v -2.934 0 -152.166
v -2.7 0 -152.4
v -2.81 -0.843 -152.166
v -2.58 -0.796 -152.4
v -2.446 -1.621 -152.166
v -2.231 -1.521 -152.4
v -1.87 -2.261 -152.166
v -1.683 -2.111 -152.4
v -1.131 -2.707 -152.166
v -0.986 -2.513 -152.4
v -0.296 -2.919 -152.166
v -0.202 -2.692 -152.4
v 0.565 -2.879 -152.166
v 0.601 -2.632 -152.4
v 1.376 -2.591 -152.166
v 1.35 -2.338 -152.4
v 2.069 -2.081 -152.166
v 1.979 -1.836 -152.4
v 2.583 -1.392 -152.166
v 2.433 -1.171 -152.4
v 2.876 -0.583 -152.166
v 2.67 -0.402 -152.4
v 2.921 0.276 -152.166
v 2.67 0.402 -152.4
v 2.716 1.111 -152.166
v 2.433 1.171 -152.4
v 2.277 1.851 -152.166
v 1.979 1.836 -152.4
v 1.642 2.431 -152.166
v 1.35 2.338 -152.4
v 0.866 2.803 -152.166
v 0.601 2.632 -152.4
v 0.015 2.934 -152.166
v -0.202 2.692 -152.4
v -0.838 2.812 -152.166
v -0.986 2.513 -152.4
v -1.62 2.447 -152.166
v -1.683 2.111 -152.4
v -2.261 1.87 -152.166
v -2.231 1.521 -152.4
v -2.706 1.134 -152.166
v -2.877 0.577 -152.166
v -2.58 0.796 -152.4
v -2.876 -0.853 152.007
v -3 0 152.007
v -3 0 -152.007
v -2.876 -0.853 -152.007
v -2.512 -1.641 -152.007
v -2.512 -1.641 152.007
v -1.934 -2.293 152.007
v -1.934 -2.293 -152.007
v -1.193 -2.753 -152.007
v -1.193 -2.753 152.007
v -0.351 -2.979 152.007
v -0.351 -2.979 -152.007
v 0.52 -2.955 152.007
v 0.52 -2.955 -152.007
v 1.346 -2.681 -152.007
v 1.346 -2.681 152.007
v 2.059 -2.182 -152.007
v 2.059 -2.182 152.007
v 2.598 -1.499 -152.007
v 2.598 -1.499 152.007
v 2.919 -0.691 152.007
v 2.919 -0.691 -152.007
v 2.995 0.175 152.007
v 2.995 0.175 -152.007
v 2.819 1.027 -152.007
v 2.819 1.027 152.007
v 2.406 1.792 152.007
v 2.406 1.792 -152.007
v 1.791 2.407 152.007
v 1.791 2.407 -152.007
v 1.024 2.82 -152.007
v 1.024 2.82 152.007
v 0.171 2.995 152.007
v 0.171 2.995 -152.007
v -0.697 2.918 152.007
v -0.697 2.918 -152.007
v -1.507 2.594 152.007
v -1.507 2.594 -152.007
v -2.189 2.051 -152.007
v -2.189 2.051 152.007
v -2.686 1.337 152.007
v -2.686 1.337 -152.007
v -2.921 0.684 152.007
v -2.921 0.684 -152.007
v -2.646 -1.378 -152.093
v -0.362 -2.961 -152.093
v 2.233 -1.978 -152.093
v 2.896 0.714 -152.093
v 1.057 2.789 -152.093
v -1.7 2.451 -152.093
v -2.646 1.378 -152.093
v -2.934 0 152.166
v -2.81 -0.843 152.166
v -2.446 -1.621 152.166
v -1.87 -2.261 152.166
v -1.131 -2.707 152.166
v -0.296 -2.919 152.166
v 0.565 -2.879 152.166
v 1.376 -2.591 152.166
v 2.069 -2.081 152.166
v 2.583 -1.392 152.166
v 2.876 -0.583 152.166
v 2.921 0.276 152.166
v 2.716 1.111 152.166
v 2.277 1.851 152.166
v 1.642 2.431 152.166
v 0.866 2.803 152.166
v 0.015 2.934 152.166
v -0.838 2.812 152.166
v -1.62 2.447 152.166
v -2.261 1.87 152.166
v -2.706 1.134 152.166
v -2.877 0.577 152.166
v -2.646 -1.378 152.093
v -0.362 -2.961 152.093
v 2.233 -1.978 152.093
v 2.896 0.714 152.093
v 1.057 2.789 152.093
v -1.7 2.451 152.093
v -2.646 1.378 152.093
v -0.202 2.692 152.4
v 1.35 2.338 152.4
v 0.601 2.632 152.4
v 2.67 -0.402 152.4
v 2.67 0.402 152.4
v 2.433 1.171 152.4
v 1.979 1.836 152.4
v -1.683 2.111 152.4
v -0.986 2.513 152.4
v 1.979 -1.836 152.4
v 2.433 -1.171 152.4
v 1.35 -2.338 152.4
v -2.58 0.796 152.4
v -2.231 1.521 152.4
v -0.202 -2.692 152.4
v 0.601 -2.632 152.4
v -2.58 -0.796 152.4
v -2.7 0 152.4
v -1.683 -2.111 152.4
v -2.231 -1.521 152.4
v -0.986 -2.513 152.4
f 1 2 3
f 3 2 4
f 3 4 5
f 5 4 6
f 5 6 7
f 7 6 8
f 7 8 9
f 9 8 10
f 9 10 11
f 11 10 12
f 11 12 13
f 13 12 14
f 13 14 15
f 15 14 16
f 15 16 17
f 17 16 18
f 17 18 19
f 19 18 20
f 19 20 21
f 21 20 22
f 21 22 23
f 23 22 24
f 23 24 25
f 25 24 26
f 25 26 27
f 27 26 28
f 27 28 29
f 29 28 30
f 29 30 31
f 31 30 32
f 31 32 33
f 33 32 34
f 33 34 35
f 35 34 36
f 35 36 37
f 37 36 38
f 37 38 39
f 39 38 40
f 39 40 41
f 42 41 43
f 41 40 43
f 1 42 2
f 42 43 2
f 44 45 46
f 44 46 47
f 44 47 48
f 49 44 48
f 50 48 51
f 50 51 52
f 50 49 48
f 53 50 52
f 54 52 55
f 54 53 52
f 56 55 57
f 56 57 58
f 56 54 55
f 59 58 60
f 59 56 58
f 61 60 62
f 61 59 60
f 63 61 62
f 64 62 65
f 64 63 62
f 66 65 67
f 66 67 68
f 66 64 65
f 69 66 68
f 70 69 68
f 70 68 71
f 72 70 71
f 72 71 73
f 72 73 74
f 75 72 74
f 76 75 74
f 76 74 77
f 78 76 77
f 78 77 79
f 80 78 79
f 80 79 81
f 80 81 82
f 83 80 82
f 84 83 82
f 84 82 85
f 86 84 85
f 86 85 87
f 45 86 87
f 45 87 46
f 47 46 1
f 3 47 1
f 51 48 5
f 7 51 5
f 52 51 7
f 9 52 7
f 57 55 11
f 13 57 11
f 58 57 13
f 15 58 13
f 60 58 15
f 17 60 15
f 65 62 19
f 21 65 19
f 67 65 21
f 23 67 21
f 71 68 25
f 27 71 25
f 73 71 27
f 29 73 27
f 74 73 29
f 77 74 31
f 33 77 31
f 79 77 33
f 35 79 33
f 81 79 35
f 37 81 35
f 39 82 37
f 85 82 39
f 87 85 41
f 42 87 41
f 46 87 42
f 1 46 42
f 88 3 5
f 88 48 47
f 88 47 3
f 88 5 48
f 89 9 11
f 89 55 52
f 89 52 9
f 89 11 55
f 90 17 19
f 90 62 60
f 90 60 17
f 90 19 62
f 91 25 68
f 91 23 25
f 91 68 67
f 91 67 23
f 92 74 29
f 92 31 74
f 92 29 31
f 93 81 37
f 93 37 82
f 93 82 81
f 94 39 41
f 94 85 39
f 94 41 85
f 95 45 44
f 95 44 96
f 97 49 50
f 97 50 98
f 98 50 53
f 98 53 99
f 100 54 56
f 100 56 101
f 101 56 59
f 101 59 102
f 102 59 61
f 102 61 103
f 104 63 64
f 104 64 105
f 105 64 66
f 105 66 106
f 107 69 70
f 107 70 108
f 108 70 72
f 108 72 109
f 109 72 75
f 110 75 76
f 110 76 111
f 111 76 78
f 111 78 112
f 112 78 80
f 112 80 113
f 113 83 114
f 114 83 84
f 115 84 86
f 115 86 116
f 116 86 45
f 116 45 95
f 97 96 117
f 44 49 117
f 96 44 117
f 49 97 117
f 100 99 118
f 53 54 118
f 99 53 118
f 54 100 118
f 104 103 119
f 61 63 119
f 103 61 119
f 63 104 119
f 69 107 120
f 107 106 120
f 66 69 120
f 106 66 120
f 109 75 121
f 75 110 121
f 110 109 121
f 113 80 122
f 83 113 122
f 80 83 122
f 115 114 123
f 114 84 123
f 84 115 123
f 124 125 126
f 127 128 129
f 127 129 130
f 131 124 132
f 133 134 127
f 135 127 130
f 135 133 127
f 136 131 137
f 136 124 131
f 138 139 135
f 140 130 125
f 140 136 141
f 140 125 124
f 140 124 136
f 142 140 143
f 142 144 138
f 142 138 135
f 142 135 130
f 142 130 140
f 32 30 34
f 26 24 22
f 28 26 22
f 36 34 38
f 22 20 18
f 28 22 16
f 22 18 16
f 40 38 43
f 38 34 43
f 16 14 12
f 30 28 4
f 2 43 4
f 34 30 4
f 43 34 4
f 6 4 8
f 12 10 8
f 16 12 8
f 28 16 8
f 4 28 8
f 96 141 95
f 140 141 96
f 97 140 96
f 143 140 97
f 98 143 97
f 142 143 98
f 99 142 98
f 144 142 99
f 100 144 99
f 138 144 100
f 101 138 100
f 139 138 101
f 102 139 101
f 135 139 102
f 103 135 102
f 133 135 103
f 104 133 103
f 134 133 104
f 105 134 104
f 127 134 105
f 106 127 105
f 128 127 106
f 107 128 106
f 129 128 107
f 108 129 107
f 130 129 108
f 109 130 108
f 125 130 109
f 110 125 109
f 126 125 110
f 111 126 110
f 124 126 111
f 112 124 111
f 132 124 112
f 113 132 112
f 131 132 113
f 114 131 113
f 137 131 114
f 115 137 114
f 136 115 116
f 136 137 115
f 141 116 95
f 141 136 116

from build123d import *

# Parameters (mm, degrees)
SKETCH3_R           = 3
BOSS_EXTRUDE1_DEPTH = 152.4
CHAMFER1_SIZE       = 0.3
FILLET1_R           = 0.225


with BuildPart() as part:
    # Sketch3 → Boss-Extrude1 (new, symmetric)
    with BuildSketch(Plane.XY):
        with Locations(Location((0, 0, 0), (0, 0, 180))):
            Circle(SKETCH3_R)
    extrude(amount=BOSS_EXTRUDE1_DEPTH, both=True)

    # Chamfer1
    chamfer1_edges = [part.edges().sort_by_distance(p)[0] for p in [
        (3, 0, -152.4),
        (3, 0, 152.4),
    ]]
    chamfer(chamfer1_edges, length=CHAMFER1_SIZE)

    # Fillet1
    fillet1_edges = [part.edges().sort_by_distance(p)[0] for p in [
        (3, 0, 152.1),
        (3, 0, -152.1),
    ]]
    fillet(fillet1_edges, radius=FILLET1_R)


solid = part.part
